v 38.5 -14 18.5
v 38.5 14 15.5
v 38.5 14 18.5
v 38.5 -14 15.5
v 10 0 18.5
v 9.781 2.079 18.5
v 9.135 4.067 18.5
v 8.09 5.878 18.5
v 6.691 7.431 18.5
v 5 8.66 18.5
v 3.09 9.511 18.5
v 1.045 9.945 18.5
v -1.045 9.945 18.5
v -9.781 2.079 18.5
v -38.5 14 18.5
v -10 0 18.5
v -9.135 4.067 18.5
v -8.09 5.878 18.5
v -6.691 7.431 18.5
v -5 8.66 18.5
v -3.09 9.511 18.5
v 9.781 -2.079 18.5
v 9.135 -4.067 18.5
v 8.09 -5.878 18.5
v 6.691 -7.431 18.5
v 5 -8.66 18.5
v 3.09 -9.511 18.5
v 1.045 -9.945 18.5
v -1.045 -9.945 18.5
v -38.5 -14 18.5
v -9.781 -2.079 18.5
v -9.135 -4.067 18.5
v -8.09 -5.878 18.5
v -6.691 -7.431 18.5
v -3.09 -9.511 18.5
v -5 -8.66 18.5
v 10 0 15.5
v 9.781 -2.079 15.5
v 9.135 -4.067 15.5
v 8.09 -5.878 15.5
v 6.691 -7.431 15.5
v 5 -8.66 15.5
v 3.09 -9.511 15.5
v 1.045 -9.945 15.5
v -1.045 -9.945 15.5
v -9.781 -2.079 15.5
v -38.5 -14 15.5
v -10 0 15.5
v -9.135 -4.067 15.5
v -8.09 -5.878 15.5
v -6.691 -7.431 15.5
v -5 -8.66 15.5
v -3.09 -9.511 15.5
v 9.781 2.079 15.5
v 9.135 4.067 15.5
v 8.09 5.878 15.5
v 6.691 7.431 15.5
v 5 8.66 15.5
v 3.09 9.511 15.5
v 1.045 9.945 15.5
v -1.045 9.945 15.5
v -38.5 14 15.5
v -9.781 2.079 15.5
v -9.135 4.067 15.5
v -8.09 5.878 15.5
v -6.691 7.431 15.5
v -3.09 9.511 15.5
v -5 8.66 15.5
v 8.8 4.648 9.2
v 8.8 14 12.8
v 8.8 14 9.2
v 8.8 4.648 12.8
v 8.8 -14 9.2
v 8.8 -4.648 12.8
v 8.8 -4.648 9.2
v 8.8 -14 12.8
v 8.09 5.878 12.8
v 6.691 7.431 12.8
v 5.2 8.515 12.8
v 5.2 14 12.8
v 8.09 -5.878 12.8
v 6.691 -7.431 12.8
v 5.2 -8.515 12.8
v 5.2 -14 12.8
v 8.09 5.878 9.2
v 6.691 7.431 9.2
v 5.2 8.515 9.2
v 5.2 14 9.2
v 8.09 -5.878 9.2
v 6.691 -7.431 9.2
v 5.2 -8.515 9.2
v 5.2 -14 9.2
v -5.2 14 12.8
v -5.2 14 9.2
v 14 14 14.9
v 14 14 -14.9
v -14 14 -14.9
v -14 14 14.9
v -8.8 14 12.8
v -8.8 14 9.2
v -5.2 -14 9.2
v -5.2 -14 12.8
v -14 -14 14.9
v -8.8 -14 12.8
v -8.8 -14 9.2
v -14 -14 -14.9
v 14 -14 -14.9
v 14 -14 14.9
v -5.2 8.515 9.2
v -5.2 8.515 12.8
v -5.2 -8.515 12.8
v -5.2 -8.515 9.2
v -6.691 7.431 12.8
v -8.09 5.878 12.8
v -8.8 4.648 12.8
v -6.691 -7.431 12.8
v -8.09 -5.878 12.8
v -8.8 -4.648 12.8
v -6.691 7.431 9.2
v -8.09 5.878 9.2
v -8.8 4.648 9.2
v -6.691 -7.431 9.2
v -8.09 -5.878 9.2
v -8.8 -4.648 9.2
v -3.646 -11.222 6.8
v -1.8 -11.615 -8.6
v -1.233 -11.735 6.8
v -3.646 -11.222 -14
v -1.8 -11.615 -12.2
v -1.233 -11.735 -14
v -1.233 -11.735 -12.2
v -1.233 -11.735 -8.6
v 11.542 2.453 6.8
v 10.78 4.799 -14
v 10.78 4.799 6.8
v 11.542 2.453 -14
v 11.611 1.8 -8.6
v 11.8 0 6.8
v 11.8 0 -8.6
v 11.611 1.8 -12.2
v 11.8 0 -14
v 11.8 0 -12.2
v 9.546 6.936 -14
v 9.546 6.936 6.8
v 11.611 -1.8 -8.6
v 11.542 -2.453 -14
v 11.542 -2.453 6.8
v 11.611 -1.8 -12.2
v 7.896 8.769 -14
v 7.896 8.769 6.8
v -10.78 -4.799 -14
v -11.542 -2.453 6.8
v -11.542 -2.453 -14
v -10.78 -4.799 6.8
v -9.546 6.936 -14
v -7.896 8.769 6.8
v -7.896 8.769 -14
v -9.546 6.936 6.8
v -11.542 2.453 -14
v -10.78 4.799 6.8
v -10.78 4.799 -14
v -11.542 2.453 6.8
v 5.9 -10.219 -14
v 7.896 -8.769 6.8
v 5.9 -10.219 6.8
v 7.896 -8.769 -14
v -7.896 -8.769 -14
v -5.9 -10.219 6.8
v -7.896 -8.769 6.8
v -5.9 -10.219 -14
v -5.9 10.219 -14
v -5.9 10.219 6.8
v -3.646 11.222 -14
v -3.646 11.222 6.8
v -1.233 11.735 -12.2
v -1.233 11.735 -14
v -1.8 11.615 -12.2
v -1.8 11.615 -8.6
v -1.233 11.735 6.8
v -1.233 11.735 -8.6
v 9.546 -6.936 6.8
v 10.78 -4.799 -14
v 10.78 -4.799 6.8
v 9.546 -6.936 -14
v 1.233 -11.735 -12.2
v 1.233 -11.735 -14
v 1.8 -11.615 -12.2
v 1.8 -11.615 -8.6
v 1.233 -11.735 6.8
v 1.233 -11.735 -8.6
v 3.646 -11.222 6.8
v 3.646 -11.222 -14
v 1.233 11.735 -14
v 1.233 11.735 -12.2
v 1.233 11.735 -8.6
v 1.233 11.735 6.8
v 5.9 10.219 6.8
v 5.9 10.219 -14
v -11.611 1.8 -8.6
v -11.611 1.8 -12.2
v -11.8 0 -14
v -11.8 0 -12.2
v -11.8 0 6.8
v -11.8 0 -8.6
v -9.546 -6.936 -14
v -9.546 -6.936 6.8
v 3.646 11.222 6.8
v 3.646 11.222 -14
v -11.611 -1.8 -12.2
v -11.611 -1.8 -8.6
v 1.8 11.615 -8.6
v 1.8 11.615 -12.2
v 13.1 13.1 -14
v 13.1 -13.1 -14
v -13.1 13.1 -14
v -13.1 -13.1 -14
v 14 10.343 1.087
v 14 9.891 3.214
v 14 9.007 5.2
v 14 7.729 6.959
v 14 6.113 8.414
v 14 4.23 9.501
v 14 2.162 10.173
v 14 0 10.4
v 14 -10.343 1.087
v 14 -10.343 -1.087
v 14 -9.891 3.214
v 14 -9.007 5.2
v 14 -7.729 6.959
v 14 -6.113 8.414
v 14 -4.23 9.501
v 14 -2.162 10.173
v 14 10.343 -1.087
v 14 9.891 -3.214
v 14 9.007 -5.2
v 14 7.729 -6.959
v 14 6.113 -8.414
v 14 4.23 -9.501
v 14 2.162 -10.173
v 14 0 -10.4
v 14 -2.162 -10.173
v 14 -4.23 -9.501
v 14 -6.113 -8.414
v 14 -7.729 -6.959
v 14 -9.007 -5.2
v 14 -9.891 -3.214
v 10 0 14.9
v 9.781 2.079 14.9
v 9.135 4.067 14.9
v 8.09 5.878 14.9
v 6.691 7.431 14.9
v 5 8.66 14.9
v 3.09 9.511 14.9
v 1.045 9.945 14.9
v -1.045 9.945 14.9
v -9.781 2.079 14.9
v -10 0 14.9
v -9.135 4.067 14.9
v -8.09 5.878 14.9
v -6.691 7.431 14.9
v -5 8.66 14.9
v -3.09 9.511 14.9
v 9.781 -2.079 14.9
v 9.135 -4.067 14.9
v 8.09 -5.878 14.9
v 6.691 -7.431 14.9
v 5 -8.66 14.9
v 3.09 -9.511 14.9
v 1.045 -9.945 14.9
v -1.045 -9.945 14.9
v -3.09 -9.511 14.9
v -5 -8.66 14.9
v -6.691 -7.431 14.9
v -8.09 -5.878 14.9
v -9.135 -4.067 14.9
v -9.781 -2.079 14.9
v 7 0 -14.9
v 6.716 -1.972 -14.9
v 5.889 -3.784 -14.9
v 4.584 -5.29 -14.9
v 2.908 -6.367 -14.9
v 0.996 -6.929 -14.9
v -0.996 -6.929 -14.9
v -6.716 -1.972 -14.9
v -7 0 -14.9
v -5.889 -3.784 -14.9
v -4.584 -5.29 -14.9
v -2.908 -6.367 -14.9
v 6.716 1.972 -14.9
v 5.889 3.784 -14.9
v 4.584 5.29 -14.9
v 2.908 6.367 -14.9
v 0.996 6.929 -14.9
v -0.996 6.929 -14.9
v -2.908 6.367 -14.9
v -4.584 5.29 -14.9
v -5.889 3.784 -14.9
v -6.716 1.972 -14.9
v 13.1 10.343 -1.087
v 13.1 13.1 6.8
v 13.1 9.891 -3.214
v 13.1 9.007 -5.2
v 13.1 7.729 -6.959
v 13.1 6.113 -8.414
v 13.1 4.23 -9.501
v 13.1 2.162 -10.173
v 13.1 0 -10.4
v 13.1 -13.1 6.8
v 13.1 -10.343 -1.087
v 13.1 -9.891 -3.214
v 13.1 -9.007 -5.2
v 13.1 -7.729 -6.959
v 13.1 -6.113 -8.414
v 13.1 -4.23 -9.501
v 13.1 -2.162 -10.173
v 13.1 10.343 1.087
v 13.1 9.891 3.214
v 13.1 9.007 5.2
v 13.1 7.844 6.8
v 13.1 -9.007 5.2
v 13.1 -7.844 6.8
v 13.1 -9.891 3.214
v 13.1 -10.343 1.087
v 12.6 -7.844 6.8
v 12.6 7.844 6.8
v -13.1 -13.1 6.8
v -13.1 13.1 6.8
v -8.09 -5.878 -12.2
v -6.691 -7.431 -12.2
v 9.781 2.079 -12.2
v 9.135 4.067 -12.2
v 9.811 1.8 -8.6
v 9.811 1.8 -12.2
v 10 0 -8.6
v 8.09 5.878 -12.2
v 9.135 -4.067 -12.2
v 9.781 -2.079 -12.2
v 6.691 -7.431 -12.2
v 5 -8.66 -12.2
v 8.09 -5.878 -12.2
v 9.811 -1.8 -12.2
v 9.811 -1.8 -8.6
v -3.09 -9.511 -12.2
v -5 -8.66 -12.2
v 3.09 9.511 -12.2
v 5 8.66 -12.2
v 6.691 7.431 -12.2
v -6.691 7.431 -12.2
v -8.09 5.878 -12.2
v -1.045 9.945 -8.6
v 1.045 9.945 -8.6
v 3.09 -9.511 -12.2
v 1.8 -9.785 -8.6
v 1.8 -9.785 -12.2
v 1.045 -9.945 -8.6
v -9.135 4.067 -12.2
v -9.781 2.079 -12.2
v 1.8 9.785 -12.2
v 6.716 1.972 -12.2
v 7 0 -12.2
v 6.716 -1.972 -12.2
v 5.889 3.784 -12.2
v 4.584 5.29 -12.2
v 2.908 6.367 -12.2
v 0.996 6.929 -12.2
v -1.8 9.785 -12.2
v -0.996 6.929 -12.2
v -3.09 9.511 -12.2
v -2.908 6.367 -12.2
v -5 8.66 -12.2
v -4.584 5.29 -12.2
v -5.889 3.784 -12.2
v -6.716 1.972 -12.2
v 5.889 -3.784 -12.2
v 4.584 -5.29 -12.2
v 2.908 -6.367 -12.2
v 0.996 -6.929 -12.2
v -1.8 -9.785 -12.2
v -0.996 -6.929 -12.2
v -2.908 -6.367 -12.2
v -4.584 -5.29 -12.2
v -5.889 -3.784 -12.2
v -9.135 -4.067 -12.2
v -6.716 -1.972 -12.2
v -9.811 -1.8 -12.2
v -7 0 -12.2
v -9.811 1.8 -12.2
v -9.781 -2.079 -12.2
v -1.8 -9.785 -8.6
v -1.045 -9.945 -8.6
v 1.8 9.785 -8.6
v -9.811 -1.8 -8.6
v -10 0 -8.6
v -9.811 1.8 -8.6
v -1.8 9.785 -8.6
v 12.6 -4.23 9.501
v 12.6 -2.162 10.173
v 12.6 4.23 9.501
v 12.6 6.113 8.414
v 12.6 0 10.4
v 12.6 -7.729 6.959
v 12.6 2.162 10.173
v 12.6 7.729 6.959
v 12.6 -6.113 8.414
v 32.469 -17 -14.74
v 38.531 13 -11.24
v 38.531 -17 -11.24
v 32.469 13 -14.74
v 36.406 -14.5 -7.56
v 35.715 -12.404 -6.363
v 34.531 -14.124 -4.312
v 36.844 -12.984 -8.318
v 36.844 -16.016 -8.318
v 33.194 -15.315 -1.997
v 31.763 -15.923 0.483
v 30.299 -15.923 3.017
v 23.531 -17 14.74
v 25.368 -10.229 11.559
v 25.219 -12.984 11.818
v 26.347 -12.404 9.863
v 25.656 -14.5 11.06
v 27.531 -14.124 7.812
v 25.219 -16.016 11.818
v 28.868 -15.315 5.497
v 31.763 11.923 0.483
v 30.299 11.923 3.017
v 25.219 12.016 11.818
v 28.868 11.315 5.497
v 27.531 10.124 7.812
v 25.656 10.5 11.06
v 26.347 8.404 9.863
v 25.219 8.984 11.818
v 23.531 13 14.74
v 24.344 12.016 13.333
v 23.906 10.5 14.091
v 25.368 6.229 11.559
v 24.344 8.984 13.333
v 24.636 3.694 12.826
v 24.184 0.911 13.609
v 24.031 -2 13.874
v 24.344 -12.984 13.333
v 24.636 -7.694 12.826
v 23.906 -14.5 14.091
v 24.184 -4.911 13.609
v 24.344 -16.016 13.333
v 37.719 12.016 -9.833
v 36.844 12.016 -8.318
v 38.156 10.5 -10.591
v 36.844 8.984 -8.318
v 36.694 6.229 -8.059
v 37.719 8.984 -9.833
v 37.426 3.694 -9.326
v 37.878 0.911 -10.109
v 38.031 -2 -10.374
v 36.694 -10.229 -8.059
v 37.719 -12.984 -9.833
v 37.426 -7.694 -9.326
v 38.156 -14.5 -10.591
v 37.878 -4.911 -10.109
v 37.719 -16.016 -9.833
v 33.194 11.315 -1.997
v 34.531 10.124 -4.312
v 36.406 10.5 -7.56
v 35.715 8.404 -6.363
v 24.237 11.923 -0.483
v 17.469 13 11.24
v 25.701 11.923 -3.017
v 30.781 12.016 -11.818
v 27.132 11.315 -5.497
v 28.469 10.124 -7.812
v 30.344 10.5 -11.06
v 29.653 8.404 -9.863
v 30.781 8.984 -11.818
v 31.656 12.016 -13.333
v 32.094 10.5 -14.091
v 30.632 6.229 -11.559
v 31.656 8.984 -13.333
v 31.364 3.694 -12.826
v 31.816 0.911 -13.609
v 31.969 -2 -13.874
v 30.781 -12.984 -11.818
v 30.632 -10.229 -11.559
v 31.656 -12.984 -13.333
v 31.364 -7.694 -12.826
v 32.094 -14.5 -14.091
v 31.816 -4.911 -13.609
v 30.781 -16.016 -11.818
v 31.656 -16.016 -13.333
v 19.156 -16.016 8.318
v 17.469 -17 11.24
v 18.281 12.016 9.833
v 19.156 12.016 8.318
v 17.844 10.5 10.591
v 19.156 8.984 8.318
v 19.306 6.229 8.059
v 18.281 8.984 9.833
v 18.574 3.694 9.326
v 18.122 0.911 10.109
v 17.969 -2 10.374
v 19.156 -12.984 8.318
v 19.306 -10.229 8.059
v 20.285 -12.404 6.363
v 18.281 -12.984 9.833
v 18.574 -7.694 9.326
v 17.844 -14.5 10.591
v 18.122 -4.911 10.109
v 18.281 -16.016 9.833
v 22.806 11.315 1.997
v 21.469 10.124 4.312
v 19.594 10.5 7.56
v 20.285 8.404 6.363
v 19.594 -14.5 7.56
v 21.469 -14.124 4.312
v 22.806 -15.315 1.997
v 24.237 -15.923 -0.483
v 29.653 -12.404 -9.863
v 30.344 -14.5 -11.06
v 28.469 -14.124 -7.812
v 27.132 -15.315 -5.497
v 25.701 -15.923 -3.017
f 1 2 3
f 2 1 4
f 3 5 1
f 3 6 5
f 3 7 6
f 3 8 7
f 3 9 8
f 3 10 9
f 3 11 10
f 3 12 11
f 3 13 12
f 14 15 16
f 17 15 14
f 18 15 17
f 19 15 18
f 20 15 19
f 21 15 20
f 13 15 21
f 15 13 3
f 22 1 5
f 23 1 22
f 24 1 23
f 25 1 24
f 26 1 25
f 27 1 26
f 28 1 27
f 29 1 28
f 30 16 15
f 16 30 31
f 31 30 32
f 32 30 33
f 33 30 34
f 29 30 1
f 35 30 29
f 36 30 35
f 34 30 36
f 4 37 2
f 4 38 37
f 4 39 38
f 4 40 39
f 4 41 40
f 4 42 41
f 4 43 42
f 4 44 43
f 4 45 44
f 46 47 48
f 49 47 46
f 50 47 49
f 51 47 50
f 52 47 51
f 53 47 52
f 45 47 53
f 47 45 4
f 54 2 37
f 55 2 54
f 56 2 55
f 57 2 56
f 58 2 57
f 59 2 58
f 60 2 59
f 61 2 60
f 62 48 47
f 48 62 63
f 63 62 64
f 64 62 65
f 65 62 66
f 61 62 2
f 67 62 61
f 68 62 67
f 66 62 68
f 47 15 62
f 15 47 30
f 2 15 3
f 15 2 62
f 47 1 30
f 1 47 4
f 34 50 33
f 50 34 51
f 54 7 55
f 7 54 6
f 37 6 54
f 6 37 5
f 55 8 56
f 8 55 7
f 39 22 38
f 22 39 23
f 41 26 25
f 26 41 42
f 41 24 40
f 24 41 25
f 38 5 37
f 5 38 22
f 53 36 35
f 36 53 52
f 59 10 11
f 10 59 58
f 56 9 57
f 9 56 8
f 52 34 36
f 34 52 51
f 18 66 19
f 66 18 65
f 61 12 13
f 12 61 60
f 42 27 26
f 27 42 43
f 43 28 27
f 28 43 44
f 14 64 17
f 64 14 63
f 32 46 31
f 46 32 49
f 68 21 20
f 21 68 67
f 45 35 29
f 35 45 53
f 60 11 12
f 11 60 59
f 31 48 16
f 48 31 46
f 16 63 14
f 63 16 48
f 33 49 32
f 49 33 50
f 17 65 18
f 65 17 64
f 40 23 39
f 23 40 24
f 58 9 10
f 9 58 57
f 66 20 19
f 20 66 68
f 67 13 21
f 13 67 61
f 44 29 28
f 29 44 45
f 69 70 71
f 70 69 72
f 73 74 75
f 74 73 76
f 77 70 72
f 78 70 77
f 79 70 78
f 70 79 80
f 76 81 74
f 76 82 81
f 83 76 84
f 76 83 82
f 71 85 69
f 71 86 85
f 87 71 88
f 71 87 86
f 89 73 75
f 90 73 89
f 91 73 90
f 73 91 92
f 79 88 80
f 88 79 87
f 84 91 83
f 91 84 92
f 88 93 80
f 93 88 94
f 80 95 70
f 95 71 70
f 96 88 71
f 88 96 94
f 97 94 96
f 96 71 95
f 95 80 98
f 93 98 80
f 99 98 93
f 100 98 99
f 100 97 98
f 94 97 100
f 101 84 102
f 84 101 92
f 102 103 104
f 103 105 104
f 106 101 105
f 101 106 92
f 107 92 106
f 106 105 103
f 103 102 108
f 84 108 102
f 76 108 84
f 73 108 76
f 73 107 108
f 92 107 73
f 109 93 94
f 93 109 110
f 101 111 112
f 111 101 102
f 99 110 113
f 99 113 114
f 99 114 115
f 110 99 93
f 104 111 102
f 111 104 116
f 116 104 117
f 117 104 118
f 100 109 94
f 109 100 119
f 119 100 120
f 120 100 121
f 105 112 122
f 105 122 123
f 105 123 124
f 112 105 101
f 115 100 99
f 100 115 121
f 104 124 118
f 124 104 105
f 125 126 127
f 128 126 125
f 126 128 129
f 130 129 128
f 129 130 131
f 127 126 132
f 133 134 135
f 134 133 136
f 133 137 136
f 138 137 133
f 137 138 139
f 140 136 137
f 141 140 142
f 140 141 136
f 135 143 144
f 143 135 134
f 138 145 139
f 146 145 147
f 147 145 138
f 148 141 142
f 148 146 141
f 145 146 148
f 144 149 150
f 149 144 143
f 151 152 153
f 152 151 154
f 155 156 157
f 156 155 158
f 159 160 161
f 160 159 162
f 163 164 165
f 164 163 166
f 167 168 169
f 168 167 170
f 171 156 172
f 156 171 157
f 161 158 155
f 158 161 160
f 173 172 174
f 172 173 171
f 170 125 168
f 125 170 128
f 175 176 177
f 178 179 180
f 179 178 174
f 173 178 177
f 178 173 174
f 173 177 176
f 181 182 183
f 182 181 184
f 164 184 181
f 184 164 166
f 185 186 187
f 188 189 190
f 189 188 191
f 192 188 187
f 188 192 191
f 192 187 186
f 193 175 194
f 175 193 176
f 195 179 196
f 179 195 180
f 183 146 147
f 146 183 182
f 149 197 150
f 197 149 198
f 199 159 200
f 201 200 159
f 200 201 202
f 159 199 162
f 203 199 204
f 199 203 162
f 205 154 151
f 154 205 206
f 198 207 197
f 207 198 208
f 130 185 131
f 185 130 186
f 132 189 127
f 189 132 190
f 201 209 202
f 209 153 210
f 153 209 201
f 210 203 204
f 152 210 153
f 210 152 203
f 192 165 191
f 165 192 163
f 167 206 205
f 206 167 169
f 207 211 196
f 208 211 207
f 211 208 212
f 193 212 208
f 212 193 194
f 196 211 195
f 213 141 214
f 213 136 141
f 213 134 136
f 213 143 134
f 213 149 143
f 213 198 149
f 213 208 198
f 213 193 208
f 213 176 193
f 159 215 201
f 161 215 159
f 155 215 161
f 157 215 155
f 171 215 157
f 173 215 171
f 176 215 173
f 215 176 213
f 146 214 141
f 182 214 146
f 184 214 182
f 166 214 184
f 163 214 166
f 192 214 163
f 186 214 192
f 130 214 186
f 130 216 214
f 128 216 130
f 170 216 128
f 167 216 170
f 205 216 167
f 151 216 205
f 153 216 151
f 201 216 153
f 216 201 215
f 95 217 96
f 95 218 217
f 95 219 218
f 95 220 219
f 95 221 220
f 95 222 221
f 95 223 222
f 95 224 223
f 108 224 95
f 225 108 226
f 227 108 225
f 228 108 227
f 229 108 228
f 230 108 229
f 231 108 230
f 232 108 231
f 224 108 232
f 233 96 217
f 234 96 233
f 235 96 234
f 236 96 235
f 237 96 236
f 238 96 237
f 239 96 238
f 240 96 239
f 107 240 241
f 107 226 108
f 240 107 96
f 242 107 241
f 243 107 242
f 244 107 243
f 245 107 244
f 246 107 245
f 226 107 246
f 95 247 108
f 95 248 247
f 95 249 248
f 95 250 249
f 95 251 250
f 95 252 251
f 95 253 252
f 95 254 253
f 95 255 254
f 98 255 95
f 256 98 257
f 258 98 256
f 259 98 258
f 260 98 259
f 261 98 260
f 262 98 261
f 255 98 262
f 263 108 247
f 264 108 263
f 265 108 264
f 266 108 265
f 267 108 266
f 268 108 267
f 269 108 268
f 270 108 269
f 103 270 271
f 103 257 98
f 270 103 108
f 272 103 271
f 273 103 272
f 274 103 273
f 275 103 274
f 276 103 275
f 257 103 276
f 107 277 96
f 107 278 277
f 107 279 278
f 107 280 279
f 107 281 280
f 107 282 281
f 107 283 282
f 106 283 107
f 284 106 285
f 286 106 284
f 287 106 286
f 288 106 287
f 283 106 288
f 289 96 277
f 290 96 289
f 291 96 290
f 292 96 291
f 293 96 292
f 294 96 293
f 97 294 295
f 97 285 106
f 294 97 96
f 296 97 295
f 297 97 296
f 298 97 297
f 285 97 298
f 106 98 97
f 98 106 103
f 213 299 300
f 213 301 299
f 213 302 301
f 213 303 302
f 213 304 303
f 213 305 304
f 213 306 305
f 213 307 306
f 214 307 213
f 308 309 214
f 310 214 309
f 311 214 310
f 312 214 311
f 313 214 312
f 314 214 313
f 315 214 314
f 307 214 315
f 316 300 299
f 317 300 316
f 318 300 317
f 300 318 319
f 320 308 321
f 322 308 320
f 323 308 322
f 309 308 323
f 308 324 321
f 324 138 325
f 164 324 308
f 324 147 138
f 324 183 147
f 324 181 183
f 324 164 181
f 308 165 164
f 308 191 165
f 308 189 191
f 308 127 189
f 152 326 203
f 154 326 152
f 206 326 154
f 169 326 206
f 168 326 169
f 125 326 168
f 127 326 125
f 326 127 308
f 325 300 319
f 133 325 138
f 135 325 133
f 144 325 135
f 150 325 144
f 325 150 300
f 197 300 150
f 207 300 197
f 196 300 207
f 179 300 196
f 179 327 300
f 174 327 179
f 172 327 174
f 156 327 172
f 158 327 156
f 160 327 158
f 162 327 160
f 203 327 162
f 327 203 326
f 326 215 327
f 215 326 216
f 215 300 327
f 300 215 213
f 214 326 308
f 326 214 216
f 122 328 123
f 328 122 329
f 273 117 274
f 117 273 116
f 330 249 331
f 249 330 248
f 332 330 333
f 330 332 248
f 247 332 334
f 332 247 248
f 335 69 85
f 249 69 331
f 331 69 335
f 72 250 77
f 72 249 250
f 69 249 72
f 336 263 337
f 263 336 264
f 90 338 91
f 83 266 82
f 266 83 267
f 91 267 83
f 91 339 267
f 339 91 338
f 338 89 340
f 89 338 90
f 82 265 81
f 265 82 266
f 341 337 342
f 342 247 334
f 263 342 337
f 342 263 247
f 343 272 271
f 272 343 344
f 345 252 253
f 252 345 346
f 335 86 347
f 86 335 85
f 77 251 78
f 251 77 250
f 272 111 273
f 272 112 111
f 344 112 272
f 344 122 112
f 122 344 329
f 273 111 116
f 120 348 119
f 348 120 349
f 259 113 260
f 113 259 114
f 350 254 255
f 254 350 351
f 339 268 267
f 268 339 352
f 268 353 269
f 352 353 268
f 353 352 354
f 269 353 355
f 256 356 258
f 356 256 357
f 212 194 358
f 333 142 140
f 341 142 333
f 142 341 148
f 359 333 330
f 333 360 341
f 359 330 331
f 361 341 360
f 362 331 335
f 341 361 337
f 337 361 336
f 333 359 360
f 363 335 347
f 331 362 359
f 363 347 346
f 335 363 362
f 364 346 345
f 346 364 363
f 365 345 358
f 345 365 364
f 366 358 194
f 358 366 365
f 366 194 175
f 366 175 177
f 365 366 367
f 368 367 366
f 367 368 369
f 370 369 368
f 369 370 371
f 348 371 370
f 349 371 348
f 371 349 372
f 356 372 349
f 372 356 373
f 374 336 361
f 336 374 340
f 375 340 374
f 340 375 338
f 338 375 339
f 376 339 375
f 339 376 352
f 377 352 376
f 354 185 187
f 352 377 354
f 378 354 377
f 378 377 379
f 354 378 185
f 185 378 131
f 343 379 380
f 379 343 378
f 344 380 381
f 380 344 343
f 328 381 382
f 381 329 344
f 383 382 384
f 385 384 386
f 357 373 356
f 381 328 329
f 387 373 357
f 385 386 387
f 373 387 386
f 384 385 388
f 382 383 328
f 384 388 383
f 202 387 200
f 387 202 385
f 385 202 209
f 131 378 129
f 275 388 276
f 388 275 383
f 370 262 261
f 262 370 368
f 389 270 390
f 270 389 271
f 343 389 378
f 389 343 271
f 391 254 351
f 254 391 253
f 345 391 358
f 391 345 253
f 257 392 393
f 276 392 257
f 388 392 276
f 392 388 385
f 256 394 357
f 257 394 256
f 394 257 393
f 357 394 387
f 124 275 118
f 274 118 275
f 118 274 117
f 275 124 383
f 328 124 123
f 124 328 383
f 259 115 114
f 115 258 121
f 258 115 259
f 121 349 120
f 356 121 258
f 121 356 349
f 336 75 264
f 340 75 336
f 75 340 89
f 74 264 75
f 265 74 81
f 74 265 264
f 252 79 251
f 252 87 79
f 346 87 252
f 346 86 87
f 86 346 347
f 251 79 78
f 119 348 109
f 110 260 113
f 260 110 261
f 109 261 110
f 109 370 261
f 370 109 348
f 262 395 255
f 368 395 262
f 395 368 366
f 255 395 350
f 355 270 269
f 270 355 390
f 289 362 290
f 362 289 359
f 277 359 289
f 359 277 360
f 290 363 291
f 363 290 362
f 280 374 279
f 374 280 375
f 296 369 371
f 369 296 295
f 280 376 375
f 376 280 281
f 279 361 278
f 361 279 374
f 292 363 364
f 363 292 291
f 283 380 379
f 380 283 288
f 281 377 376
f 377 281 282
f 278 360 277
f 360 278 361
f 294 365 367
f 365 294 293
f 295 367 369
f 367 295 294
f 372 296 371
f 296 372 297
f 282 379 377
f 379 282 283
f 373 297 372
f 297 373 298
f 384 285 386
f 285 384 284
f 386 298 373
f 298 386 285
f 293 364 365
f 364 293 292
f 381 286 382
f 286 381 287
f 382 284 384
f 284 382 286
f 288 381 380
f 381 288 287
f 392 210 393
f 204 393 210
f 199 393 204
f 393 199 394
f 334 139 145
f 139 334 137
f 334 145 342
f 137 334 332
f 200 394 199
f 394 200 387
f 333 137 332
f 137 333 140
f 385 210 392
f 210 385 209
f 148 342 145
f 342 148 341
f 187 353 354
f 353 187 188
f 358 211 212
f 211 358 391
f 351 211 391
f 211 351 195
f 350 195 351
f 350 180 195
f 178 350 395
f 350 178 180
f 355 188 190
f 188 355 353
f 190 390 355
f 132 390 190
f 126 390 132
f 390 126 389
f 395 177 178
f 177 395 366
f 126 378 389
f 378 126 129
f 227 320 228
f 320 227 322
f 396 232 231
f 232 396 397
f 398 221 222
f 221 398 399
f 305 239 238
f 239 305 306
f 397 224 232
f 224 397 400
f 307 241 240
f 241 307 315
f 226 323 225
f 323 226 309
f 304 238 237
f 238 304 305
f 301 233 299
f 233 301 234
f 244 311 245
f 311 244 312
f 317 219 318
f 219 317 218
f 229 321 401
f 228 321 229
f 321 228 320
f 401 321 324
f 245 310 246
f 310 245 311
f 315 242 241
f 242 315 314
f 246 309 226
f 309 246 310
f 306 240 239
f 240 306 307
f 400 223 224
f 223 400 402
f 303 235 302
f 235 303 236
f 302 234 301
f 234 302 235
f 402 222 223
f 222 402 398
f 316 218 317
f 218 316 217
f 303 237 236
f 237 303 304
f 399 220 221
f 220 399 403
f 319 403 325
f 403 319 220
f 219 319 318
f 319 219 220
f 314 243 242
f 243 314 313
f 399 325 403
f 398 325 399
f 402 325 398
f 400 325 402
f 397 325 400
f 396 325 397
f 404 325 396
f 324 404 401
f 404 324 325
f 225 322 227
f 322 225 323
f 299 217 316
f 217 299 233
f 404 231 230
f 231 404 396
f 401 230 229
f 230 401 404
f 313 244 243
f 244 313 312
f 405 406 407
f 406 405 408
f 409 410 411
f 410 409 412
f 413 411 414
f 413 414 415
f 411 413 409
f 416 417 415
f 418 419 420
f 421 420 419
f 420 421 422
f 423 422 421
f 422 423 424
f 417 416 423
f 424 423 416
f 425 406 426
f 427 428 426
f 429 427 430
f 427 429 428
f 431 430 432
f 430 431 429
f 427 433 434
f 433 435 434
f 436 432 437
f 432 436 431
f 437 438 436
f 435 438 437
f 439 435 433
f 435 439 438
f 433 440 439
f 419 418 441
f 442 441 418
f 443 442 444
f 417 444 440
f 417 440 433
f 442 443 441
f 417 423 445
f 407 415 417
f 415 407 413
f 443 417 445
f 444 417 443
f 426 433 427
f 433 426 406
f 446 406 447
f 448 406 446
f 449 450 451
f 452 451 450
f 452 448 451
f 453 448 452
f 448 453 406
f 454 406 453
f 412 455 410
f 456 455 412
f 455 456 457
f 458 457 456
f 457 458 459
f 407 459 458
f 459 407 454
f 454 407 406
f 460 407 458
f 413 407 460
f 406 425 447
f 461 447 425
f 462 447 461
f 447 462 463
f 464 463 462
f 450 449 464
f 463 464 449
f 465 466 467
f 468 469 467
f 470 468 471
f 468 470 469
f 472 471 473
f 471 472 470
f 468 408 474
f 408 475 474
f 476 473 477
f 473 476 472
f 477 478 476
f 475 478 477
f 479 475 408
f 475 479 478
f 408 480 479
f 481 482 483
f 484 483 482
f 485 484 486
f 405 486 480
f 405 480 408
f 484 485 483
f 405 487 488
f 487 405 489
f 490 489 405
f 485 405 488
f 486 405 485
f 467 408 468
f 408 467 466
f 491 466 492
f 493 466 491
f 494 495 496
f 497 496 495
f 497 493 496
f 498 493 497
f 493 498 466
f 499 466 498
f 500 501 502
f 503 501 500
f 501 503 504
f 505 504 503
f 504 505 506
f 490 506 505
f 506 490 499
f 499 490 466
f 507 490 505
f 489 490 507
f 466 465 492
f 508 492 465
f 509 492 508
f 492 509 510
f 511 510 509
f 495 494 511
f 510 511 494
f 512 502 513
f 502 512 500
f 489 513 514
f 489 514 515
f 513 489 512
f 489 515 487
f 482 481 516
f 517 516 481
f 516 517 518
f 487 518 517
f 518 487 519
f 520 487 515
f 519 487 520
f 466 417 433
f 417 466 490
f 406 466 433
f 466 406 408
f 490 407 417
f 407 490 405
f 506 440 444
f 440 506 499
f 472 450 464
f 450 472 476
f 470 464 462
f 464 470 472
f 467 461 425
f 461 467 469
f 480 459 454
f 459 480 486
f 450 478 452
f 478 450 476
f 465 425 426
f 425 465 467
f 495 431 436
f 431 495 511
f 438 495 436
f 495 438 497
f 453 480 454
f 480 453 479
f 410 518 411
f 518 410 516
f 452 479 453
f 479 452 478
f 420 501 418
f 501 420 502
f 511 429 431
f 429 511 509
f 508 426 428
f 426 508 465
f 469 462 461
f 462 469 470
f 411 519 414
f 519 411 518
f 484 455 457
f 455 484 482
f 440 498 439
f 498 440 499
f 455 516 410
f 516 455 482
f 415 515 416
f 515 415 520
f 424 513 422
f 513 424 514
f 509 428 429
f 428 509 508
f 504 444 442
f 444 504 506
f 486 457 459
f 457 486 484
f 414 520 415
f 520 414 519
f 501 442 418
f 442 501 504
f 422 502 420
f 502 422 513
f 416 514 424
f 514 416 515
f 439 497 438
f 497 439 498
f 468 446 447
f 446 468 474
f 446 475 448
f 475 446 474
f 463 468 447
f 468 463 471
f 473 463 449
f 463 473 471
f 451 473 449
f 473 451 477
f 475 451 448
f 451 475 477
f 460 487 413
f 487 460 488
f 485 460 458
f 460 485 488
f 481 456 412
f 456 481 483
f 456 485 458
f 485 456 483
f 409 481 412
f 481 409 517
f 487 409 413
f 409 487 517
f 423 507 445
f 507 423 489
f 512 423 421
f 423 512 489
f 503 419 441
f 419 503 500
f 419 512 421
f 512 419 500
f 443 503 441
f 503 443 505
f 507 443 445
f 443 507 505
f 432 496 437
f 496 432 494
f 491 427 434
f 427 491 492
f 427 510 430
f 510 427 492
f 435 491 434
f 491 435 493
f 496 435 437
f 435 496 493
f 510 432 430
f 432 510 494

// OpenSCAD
/*
 *  OpenSCAD gregs_wade_cooling_hood.scad 
 *  Copyright (C) 2014 Mogue Carpenter
 *
 *  License: LGPL 2.1 or later
 *
 *  Design for a two 40mm fan cooling hood 
 *  for a gred wades extruder.
 *
*/

// overall block
height = 40;
width = 28;
lenght = 77;

attachment_plate_height = 3;
wall_thinkness = 1.8;

peek_chamber_h = 28;
peek_chamber_r = 10;
peek_skirt_r = 7;

hole_r = 10;



attachment_plate();
peek_cooling_block();

module attachment_plate(){
	difference(){
		translate([0,0,(height/2)-attachment_plate_height])
			cube([lenght,width,attachment_plate_height], center=true);
		translate([0,0,(height/2)-attachment_plate_height])
			cylinder (h=peek_chamber_h,r=peek_chamber_r, center=true);
	}
}

module peek_cooling_block(){
	difference(){
		peek_chamber_block();

		// peek chamber
		translate([0,0,wall_thinkness])
			cylinder (h=peek_chamber_h,r=peek_chamber_r, center=true);

		// peek skirt
		cylinder (h=peek_chamber_h+wall_thinkness*2,r=peek_skirt_r, center=true);

		// exahust 
		translate([0,0,-(peek_chamber_h/2)+wall_thinkness*2])
			cube([(peek_chamber_r+wall_thinkness)*2,wall_thinkness*2,wall_thinkness*2] , center=true);
		translate([0,0,-(peek_chamber_h/2)+wall_thinkness*2])
			cube([wall_thinkness*2,(peek_chamber_r+wall_thinkness)*2,wall_thinkness*2] , center=true);

		// fan hole
		translate([width/2,0,0])
			rotate([0,90,0])
				cylinder(h=wall_thinkness+1, r=(width/2)-(wall_thinkness*2), center=true);
	}
}


module peek_chamber_block(){
	difference(){
		translate([0,0,-(wall_thinkness)]	)
			cylinder (h=peek_chamber_h-(wall_thinkness*2),r=peek_chamber_r+wall_thinkness, center=true);
		intake_holes();
}

	// Peek Air Passage
	difference(){
		// outer wall
		cube ([width,width,peek_chamber_h+wall_thinkness],center=true);

		// inner chamber
		translate([0,0,-wall_thinkness*2])
		cube ([width-wall_thinkness,width-wall_thinkness,peek_chamber_h-(wall_thinkness*4)],center=true);

		intake_holes();
	}
}


module intake_holes(){
		// intake holes
		translate([width/4,0,(peek_chamber_h/2)-(attachment_plate_height)])
			cube([wall_thinkness*2,width,wall_thinkness*2] , center=true);
		translate([-width/4,0,(peek_chamber_h/2)-(attachment_plate_height)])
			cube([wall_thinkness*2,width,wall_thinkness*2] , center=true);
}





// fan 50mm
fan_width = 50;
fan_height = 11;
fan_r = 22.25;
screw_hole_r =  2.25 ;
screw_hole_off_set = 5.5;

// fan 40mm


// fan 30mm
fan_width = 30;
fan_height = 7;
fan_r = 14;
screw_hole_r =  1.75 ;
screw_hole_off_set = 2.5;

translate([width,width-fan_width,0])	rotate([0,60,0])
		fan_model();

/* the dimension of the rectangle that would define its height when rotated would be the lenght from corner to corner, so you would find that length c = sqrt(a^2 +b^2) and then the height you would have would an original angle a=tan^-1(b/a) and the new height would be defined by h = c*sin^-1(a+new angle)
*/

module fan_model(){
	fan_screw_tran = (fan_width/2)-screw_hole_off_set;

	difference(){
		cube ([fan_width,fan_width,fan_height],center=true);
		cylinder( h=fan_height, r=fan_r, center = true );
		// main fan hole
		translate([fan_width-screw_hole_off_set-screw_hole_r,0,0])
			cylinder( h=fan_height, r=screw_hole_r, center = true );

		// screw holes
 		translate([fan_screw_tran,fan_screw_tran,0])
			cylinder( h=fan_height, r=screw_hole_r, center = true );
 		translate([fan_screw_tran,-fan_screw_tran,0])
			cylinder( h=fan_height, r=screw_hole_r, center = true );
 		translate([-fan_screw_tran,-fan_screw_tran,0])
			cylinder( h=fan_height, r=screw_hole_r, center = true );
 		translate([-fan_screw_tran,fan_screw_tran,0])
			cylinder( h=fan_height, r=screw_hole_r, center = true );
	}
}

//duct_stencil();

//rotate_extrude() translate([20, 0]) square([10, 20]);
// rotate_extrude($fn = 8) translate([hole_r,0])
//	rotate([0,90,0])
//	linear_extrude(height=1) duct_stencil();

module duct_stencil(){
	duct_height = 5;
	duct_lenght = 30;
	duct_angle = 30;

	duct_apature=duct_height/cos(90-duct_angle);
	lost_lenght = duct_height * tan(90-duct_angle);

	duct_short_internal_lenght = (duct_lenght-lost_lenght);
	duct_bend_x = (duct_short_internal_lenght*cos(duct_angle));

	duct_bend_y = (duct_short_internal_lenght*sin(duct_angle));

	//translate([0,hole_r]) square([duct_apature,duct_apature]);
	//translate([duct_bend_y,hole_r+duct_apature]) square([duct_bend_x,duct_bend_x]);

	translate([-fan_width-duct_bend_y,duct_bend_x])
		square([fan_width,duct_apature]);

		rotate(duct_angle)
			square([duct_height,duct_lenght]);
}

module duct_bend(){
// part fan duct
p_duct_r = 5;
ell_factor = 2.5;

	translate([-15,0,0]){
		difference(){
			scale([2.5, 1]) circle(r=p_duct_r, center=false);
			translate([0,p_duct_r]) scale([2, 1]) circle(r=p_duct_r, center=false);
			translate([0,-p_duct_r]) square(p_duct_r*ell_factor,p_duct_r*ell_factor);
	}
		translate([-(p_duct_r*ell_factor),0]) square(p_duct_r,p_duct_r);
	}
}
